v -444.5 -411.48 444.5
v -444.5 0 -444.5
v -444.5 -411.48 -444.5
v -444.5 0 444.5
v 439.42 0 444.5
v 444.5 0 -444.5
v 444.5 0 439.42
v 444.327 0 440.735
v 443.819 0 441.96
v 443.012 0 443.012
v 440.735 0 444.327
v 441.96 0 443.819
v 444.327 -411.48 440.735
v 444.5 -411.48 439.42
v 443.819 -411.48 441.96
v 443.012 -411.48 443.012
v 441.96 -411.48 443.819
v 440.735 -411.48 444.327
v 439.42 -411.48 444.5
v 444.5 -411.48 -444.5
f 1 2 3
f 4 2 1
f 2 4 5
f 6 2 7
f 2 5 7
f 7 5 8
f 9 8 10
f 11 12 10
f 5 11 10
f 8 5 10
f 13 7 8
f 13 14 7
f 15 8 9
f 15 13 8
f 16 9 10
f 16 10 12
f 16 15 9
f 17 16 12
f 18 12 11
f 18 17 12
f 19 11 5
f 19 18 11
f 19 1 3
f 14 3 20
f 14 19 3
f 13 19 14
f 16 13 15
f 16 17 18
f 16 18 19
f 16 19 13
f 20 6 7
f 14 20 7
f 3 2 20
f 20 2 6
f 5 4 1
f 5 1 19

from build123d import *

# Parameters (mm, degrees)
F0_W     = 889
F0_H     = 889
F1_DEPTH = 411.48
F2_R     = 5.08


with BuildPart() as f1:
    # F0 (on Front) → F1 (new body)
    with BuildSketch(Plane.XZ):
        Rectangle(F0_W, F0_H)
    extrude(amount=F1_DEPTH)

    # F2
    f2_edges = [f1.edges().sort_by_distance(p)[0] for p in [
        (444.5, -205.74, 444.5),
    ]]
    fillet(f2_edges, radius=F2_R)


solid = f1.part
